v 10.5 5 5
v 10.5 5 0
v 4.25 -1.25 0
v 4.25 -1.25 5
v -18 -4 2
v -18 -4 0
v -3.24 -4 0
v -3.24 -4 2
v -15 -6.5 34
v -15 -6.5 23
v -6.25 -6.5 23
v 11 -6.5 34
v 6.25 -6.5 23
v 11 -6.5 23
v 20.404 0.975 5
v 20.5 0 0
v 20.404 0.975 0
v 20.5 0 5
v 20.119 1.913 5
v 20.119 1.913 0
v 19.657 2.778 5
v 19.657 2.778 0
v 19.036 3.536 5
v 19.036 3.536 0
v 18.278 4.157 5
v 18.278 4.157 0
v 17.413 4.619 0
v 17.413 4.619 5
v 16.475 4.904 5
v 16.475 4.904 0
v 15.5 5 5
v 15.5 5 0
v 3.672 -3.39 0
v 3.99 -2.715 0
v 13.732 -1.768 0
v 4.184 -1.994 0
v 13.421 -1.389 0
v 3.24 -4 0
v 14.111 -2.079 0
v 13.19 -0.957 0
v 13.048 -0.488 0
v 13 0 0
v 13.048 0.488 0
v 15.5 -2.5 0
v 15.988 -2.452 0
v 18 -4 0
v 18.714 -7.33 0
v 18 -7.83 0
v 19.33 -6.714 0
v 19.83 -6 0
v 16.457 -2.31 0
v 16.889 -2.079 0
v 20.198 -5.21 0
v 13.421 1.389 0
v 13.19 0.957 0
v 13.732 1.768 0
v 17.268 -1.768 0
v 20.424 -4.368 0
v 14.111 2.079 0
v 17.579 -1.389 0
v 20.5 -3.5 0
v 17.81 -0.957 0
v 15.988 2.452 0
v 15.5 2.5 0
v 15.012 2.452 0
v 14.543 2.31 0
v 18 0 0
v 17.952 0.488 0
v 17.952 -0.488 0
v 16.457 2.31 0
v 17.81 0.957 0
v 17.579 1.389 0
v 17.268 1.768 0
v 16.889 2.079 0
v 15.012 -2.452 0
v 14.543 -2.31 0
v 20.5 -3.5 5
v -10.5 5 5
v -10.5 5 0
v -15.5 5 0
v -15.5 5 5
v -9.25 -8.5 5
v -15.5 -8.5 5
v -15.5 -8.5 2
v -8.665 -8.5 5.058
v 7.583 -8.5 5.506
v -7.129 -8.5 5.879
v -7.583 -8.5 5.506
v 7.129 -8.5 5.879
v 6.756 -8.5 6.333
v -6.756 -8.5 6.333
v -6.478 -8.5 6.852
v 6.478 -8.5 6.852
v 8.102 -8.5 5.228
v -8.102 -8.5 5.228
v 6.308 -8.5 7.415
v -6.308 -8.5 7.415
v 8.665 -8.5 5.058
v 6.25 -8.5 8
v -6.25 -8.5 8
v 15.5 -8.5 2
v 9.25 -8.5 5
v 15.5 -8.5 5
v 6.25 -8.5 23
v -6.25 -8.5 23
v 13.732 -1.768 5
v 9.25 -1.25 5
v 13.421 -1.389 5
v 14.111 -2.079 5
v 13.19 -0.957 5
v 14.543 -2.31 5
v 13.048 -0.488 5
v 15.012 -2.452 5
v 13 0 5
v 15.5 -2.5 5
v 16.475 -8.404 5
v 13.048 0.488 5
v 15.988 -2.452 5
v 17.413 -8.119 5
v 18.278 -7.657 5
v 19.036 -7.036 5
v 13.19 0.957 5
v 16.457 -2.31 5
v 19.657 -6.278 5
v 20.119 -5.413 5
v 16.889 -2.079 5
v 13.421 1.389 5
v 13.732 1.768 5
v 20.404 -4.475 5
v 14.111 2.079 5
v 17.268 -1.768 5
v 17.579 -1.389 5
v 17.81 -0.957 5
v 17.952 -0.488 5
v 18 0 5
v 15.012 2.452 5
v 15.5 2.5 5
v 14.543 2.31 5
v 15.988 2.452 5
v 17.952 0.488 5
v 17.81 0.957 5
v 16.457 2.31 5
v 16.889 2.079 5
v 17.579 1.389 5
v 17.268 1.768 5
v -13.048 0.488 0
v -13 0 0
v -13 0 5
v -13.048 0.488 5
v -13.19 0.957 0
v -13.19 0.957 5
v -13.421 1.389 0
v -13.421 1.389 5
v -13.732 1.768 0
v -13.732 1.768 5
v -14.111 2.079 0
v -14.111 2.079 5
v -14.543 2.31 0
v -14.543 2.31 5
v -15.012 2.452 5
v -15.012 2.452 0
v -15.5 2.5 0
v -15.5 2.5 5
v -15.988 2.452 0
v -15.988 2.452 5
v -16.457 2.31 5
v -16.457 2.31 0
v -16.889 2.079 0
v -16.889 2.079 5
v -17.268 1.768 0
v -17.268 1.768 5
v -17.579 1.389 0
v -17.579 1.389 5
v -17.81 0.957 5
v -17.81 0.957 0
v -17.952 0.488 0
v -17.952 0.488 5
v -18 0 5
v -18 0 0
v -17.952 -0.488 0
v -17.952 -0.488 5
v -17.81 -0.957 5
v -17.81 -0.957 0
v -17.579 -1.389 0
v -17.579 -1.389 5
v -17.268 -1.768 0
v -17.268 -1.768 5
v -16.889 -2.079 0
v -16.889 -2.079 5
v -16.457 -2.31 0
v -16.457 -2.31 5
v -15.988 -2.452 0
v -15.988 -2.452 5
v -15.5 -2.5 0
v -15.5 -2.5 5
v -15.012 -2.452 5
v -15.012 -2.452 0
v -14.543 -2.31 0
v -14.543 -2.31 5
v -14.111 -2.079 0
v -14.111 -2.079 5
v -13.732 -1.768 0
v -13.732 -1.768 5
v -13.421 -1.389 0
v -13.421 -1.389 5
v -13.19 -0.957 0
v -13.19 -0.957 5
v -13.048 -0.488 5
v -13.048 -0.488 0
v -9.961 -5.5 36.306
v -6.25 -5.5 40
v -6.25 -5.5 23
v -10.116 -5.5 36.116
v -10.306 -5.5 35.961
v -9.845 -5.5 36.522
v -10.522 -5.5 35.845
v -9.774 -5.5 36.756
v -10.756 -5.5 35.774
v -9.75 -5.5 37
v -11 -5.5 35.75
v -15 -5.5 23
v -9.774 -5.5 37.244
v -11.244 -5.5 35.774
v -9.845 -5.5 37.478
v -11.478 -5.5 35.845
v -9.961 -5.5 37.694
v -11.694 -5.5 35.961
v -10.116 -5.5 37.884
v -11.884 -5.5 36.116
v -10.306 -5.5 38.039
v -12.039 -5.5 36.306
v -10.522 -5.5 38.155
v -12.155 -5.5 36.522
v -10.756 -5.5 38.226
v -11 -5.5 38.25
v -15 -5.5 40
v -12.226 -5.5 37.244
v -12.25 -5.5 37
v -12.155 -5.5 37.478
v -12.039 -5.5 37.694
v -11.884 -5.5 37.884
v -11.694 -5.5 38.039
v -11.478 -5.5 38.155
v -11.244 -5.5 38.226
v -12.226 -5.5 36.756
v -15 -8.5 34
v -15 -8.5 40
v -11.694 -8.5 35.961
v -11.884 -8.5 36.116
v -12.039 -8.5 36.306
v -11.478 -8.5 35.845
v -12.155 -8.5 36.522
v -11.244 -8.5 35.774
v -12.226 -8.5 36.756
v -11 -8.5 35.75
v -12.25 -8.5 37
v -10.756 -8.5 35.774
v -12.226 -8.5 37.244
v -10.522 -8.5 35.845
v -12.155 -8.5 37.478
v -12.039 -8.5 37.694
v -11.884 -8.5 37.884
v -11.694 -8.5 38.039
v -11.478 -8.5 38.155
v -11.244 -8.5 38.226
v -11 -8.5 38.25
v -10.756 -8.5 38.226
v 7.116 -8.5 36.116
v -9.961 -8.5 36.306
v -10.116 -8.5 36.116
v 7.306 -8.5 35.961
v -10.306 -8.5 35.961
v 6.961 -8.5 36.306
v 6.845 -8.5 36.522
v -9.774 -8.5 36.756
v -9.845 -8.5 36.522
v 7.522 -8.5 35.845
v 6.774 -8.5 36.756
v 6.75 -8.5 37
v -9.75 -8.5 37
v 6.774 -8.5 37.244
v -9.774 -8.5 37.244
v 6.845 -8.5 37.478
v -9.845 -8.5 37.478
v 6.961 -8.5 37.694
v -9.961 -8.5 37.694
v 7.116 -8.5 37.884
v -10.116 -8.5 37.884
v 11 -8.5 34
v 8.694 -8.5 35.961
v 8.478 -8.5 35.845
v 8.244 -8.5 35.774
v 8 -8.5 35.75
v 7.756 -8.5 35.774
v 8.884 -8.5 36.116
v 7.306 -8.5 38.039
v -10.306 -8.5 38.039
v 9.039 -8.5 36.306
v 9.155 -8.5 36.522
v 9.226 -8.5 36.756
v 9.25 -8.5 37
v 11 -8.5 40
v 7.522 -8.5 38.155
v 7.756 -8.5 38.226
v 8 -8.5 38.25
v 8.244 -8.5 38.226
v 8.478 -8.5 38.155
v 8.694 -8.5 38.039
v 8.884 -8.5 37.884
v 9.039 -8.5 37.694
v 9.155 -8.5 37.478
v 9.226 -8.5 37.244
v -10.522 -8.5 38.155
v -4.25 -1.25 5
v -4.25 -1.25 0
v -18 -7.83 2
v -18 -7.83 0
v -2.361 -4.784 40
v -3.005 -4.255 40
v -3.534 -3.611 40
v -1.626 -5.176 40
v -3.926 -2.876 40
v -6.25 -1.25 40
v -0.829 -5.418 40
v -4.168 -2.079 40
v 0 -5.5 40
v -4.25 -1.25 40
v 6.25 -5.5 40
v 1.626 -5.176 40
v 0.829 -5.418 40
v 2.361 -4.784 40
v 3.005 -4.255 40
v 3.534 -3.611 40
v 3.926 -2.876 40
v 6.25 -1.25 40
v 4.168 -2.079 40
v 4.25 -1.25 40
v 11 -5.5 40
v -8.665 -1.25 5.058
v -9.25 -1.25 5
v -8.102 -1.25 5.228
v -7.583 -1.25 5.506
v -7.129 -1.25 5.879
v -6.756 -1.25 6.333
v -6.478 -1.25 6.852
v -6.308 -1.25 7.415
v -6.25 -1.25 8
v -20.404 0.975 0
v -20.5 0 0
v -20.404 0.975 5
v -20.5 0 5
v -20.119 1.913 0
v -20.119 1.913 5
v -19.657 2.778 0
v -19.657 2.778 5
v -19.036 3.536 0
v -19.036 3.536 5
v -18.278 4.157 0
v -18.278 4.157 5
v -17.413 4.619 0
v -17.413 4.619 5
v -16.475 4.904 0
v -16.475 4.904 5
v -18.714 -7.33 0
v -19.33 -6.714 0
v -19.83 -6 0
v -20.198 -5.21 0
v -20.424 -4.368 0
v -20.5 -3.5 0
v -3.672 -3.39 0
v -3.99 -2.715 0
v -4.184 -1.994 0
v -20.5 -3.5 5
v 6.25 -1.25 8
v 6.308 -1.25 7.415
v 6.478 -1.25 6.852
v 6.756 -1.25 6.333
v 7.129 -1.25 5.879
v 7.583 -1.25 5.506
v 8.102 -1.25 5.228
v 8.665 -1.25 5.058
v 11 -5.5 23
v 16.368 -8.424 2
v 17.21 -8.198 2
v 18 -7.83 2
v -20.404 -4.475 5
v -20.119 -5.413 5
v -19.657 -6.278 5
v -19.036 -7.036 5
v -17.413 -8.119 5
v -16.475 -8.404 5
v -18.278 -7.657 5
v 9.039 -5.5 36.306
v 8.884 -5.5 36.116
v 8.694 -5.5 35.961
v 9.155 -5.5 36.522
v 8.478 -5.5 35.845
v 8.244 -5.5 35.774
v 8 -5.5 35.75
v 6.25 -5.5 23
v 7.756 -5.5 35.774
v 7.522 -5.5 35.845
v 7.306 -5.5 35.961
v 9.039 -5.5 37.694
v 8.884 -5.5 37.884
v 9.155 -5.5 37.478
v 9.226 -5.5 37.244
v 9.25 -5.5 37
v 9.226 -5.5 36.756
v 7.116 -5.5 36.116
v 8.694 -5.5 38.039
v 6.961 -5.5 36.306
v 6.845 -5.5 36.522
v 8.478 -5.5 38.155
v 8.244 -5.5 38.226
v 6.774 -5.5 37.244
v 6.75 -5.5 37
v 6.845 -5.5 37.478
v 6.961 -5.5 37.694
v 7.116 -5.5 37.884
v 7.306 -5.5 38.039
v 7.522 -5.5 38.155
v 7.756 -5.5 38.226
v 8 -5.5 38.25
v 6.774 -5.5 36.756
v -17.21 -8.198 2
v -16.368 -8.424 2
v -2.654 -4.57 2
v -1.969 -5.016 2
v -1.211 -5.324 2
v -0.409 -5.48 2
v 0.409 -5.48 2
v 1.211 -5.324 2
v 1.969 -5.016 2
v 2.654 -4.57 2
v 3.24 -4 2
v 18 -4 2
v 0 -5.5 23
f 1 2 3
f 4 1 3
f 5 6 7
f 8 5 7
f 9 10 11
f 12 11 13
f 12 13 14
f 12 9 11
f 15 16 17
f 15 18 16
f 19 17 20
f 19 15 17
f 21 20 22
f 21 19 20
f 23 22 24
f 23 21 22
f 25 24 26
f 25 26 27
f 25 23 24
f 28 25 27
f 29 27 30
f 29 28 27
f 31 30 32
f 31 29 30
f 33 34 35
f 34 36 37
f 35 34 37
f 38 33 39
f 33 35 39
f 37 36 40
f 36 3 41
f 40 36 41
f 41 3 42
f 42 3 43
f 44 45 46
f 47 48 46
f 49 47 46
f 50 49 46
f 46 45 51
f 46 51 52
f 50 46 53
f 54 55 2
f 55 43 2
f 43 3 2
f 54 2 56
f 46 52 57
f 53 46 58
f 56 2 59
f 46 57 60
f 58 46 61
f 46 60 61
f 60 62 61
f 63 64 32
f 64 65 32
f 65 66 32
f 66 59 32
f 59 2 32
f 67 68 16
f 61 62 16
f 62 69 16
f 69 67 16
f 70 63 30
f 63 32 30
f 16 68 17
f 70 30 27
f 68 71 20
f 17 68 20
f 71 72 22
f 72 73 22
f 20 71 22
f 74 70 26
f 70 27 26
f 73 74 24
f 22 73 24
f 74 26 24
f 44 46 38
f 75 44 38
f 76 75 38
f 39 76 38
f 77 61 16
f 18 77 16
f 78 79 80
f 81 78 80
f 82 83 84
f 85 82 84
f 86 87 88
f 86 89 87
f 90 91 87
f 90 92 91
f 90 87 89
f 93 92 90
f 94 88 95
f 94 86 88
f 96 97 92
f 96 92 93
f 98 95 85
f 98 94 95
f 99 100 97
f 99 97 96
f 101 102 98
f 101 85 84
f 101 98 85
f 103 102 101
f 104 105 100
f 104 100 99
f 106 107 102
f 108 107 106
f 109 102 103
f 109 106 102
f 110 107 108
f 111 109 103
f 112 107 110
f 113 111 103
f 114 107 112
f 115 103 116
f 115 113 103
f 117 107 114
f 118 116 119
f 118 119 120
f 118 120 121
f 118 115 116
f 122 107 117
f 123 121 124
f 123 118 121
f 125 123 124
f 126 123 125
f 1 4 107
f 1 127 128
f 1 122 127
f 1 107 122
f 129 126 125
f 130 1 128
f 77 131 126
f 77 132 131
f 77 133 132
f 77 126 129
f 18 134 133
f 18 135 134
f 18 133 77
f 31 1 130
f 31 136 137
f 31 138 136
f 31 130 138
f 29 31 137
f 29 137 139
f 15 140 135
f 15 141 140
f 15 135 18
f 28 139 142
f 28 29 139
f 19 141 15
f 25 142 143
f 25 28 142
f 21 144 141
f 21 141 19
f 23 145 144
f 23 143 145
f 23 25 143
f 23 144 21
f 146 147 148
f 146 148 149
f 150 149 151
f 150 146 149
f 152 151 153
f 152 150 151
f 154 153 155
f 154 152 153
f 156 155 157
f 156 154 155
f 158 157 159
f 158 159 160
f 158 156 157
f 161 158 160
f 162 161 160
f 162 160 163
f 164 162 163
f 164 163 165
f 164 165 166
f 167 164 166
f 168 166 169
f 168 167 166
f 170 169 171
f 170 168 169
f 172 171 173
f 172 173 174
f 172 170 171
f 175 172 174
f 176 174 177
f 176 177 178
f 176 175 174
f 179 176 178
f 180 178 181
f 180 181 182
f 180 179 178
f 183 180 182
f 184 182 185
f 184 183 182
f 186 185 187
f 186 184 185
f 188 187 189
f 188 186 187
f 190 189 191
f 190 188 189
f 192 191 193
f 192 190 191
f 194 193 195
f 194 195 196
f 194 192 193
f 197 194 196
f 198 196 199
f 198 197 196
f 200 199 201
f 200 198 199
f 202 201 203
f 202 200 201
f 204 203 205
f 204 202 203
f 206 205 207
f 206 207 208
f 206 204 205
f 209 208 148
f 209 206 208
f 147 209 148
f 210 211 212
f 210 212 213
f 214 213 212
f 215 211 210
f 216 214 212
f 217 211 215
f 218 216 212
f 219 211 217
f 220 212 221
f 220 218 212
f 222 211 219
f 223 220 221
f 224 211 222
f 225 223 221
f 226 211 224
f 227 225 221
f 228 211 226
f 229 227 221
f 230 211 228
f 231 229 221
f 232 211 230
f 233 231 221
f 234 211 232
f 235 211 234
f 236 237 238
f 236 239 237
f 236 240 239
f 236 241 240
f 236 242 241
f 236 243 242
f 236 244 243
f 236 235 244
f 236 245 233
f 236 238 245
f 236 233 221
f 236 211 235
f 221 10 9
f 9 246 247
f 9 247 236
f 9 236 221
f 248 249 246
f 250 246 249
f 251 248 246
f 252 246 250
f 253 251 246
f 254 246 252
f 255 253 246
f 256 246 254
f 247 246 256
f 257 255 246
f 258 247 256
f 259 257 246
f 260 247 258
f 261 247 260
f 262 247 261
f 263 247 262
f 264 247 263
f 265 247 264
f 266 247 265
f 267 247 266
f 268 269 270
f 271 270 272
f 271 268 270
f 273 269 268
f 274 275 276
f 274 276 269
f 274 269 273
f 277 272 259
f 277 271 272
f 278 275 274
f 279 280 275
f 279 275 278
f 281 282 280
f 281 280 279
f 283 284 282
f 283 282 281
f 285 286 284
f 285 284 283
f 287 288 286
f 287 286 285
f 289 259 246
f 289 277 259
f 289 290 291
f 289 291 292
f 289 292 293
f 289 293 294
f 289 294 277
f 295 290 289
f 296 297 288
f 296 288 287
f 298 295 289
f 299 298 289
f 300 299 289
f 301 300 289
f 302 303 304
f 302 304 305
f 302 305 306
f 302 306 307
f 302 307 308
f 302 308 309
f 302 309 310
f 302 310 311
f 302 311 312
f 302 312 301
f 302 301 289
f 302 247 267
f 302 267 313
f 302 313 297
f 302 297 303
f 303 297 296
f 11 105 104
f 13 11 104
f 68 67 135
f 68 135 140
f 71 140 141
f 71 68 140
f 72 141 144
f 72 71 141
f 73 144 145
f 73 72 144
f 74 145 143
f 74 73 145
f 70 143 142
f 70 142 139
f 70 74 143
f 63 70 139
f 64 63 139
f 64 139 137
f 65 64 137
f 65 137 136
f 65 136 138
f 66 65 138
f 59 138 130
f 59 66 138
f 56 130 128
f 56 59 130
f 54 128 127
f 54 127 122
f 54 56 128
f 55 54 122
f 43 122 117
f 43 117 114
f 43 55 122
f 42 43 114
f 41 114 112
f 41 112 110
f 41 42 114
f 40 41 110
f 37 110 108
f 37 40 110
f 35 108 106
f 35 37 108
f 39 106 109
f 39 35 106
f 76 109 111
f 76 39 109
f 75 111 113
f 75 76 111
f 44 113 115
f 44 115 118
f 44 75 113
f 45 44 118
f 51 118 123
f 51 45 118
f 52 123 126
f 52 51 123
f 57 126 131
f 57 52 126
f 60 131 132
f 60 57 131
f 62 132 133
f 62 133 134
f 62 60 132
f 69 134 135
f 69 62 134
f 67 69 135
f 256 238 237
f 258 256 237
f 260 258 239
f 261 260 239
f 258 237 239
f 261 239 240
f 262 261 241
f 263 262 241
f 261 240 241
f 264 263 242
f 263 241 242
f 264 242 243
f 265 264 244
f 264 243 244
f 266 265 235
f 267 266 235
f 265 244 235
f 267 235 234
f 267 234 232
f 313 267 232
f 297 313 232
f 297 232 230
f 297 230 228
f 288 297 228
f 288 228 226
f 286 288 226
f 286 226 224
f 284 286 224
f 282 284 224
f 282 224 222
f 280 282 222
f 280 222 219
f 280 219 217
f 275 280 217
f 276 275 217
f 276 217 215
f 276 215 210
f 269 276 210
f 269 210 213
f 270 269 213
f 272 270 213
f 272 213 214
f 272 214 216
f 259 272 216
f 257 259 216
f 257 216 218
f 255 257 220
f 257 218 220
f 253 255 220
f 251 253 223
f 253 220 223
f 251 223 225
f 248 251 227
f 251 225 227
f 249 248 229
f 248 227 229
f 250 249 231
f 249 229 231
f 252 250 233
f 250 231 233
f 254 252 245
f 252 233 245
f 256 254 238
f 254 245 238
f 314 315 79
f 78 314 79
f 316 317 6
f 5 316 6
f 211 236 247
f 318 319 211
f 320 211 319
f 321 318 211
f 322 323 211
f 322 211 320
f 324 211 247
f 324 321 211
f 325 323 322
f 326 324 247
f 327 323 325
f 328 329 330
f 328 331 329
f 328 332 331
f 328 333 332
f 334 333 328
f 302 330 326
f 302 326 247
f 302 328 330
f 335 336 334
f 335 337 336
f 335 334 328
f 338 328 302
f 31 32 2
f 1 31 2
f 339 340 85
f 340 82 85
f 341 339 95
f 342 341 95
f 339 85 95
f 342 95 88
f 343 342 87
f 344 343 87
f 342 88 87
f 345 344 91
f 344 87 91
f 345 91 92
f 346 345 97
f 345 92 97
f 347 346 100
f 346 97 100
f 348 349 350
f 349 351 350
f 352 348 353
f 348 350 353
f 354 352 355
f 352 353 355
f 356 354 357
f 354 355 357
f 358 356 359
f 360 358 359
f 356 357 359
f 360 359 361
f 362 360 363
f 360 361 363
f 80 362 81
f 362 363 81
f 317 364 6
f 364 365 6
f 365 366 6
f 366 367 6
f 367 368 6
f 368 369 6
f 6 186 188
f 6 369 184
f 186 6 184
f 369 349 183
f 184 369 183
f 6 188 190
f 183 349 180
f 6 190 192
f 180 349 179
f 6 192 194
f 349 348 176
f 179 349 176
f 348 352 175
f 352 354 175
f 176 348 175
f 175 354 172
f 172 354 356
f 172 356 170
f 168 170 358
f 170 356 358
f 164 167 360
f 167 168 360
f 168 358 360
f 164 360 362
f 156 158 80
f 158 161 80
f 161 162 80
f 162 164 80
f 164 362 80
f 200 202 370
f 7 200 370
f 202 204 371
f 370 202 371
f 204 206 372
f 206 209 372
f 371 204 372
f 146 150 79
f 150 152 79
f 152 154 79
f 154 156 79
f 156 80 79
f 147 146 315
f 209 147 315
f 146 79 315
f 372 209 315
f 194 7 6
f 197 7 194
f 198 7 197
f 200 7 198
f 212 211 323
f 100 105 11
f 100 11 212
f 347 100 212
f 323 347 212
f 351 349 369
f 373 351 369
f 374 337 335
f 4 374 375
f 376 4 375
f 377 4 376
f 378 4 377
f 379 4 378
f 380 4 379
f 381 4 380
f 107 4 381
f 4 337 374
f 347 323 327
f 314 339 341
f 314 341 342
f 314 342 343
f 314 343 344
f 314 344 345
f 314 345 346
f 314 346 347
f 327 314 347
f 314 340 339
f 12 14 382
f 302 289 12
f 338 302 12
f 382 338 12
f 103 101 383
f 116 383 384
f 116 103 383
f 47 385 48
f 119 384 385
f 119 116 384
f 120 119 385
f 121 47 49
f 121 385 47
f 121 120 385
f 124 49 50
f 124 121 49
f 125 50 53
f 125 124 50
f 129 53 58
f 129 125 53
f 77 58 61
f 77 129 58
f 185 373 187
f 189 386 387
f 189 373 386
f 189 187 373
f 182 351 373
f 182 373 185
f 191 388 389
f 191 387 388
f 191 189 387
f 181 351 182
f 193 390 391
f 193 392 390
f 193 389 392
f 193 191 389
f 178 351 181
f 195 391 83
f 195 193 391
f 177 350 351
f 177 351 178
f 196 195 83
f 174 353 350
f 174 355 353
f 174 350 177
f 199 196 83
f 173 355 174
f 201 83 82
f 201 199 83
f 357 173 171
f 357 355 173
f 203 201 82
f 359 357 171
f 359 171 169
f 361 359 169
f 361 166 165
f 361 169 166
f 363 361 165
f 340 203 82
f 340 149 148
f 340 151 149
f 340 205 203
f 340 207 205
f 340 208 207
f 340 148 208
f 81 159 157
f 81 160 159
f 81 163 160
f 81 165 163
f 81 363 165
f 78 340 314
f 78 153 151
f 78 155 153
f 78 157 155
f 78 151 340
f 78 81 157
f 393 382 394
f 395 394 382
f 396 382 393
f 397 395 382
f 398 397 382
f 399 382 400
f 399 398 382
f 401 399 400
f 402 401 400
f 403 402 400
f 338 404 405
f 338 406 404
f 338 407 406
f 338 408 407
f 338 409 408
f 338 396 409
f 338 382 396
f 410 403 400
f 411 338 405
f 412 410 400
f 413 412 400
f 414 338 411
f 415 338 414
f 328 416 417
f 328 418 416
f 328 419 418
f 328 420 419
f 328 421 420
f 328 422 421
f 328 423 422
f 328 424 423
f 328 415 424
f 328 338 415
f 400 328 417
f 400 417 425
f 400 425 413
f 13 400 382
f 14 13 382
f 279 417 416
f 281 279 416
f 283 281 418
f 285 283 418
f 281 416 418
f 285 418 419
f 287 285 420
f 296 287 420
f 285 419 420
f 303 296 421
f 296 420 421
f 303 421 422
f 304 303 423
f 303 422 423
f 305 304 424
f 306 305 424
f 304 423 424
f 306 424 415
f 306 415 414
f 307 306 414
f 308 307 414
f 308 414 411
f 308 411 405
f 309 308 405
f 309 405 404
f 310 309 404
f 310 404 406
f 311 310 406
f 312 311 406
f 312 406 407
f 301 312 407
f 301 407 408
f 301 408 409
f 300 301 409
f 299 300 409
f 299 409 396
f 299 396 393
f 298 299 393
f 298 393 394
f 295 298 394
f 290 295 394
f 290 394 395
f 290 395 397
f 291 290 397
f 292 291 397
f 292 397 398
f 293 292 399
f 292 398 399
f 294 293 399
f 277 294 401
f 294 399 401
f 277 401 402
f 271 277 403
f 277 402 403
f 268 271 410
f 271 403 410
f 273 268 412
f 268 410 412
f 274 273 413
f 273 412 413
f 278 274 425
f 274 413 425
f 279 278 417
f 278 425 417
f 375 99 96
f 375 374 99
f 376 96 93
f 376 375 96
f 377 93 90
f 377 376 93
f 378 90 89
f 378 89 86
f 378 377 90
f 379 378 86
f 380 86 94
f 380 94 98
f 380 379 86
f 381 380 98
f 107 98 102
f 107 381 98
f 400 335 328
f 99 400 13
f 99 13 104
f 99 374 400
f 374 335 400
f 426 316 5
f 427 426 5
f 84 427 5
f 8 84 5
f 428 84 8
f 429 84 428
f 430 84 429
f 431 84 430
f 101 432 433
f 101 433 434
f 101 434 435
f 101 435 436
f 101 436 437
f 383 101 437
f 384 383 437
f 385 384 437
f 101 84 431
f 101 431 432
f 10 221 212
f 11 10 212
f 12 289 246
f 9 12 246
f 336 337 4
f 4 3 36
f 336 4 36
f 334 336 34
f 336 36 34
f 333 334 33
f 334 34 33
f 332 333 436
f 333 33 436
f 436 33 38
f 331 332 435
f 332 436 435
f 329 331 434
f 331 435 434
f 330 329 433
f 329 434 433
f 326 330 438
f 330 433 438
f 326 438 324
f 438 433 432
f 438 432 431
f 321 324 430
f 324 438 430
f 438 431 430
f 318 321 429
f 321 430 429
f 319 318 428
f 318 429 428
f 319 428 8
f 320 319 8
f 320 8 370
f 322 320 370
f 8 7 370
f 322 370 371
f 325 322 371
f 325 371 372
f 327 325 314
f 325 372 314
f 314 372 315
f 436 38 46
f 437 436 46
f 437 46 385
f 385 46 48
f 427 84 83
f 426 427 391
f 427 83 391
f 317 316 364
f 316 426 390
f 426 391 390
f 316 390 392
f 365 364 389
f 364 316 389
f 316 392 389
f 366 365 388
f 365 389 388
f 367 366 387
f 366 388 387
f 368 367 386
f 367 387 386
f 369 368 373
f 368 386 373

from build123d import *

# Parameters (mm, degrees)
F0_R      = 2.5
F1_DEPTH  = 5
F3_DEPTH  = 40
F4_W      = 8.75
F4_H      = 3
F4_W_2    = 4.75
F5_DEPTH  = 17
F7_DEPTH  = 2
F8_D      = 2.5
F9_R      = 5
F11_DEPTH = 2
F12_R     = 3


with BuildPart() as f1:
    # F0 (on Top) → F1 (new body)
    with BuildSketch(Plane.XY):
        with BuildLine():
            Line((10.5, 5), (4.25, -1.25))
            ThreePointArc((4.25, -1.25), (0, -5.5), (-4.25, -1.25))
            Line((-4.25, -1.25), (-10.5, 5))
            Line((-10.5, 5), (-20.5, 5))
            Line((-20.5, 5), (-20.5, -8.5))
            Line((-20.5, -8.5), (0, -8.5))
            Line((0, -8.5), (20.5, -8.5))
            Line((20.5, -8.5), (20.5, 5))
            Line((20.5, 5), (10.5, 5))
        make_face()
        with Locations((-15.5, 0)):
            Circle(F0_R, mode=Mode.SUBTRACT)
        with Locations((15.5, 0)):
            Circle(F0_R, mode=Mode.SUBTRACT)
    extrude(amount=F1_DEPTH)

    # F2 (on face) → F3 (join)
    with BuildSketch(Plane(origin=(0, 0, 0), x_dir=(1, 0, 0), z_dir=(0, 0, -1))):
        with BuildLine():
            Line((-6.25, 1.25), (-4.25, 1.25))
            ThreePointArc((-4.25, 1.25), (0, 5.5), (4.25, 1.25))
            Line((4.25, 1.25), (6.25, 1.25))
            Line((6.25, 1.25), (6.25, 8.5))
            Line((6.25, 8.5), (-6.25, 8.5))
            Line((-6.25, 8.5), (-6.25, 1.25))
        make_face()
    extrude(amount=-F3_DEPTH)

    # F4 (on face) → F5 (join)
    with BuildSketch(Plane.XY.offset(40)):
        with Locations((-10.625, -7)):
            Rectangle(F4_W, F4_H)
        Polygon((0, -5.5), (-6.25, -5.5), (-6.25, -8.5), (6.25, -8.5), (6.25, -5.5), align=None)
        with Locations((8.625, -7)):
            Rectangle(F4_W_2, F4_H)
    extrude(amount=-F5_DEPTH)

    # F6 (on face) → F7 (cut)
    with BuildSketch(Plane.XZ.offset(8.5)):
        Polygon((11, 34), (-15, 34), (-15, 23), (-6.25, 23), (6.25, 23), (11, 23), align=None)
    extrude(amount=-F7_DEPTH, mode=Mode.SUBTRACT)

    # F8 (through all)
    with Locations(Plane.XZ.offset(8.5)):
        with Locations((-11, 37), (8, 37)):
            Hole(F8_D / 2)

    # F9
    f9_edges = [f1.edges().sort_by_distance(p)[0] for p in [
        (20.5, -8.5, 2.5),
        (-20.5, 5, 2.5),
        (-20.5, -8.5, 2.5),
        (20.5, 5, 2.5),
    ]]
    fillet(f9_edges, radius=F9_R)

    # F10 (on face) → F11 (cut)
    with BuildSketch(Plane(origin=(0, 0, 0), x_dir=(1, 0, 0), z_dir=(0, 0, -1))):
        with BuildLine():
            ThreePointArc((-15.5, 8.5), (-16.7940952255, 8.3296291314), (-18, 7.8301270189))
            Line((-18, 7.8301270189), (-18, 4))
            Line((-18, 4), (-3.2403703492, 4))
            ThreePointArc((-3.2403703492, 4), (0, 5.5), (3.2403703492, 4))
            Line((3.2403703492, 4), (18, 4))
            Line((18, 4), (18, 7.8301270189))
            ThreePointArc((18, 7.8301270189), (16.7940952255, 8.3296291314), (15.5, 8.5))
            Line((15.5, 8.5), (-15.5, 8.5))
        make_face()
    extrude(amount=-F11_DEPTH, mode=Mode.SUBTRACT)

    # F12
    f12_edges = [f1.edges().sort_by_distance(p)[0] for p in [
        (6.25, -4.875, 5),
        (-6.25, -4.875, 5),
    ]]
    fillet(f12_edges, radius=F12_R)


solid = f1.part
